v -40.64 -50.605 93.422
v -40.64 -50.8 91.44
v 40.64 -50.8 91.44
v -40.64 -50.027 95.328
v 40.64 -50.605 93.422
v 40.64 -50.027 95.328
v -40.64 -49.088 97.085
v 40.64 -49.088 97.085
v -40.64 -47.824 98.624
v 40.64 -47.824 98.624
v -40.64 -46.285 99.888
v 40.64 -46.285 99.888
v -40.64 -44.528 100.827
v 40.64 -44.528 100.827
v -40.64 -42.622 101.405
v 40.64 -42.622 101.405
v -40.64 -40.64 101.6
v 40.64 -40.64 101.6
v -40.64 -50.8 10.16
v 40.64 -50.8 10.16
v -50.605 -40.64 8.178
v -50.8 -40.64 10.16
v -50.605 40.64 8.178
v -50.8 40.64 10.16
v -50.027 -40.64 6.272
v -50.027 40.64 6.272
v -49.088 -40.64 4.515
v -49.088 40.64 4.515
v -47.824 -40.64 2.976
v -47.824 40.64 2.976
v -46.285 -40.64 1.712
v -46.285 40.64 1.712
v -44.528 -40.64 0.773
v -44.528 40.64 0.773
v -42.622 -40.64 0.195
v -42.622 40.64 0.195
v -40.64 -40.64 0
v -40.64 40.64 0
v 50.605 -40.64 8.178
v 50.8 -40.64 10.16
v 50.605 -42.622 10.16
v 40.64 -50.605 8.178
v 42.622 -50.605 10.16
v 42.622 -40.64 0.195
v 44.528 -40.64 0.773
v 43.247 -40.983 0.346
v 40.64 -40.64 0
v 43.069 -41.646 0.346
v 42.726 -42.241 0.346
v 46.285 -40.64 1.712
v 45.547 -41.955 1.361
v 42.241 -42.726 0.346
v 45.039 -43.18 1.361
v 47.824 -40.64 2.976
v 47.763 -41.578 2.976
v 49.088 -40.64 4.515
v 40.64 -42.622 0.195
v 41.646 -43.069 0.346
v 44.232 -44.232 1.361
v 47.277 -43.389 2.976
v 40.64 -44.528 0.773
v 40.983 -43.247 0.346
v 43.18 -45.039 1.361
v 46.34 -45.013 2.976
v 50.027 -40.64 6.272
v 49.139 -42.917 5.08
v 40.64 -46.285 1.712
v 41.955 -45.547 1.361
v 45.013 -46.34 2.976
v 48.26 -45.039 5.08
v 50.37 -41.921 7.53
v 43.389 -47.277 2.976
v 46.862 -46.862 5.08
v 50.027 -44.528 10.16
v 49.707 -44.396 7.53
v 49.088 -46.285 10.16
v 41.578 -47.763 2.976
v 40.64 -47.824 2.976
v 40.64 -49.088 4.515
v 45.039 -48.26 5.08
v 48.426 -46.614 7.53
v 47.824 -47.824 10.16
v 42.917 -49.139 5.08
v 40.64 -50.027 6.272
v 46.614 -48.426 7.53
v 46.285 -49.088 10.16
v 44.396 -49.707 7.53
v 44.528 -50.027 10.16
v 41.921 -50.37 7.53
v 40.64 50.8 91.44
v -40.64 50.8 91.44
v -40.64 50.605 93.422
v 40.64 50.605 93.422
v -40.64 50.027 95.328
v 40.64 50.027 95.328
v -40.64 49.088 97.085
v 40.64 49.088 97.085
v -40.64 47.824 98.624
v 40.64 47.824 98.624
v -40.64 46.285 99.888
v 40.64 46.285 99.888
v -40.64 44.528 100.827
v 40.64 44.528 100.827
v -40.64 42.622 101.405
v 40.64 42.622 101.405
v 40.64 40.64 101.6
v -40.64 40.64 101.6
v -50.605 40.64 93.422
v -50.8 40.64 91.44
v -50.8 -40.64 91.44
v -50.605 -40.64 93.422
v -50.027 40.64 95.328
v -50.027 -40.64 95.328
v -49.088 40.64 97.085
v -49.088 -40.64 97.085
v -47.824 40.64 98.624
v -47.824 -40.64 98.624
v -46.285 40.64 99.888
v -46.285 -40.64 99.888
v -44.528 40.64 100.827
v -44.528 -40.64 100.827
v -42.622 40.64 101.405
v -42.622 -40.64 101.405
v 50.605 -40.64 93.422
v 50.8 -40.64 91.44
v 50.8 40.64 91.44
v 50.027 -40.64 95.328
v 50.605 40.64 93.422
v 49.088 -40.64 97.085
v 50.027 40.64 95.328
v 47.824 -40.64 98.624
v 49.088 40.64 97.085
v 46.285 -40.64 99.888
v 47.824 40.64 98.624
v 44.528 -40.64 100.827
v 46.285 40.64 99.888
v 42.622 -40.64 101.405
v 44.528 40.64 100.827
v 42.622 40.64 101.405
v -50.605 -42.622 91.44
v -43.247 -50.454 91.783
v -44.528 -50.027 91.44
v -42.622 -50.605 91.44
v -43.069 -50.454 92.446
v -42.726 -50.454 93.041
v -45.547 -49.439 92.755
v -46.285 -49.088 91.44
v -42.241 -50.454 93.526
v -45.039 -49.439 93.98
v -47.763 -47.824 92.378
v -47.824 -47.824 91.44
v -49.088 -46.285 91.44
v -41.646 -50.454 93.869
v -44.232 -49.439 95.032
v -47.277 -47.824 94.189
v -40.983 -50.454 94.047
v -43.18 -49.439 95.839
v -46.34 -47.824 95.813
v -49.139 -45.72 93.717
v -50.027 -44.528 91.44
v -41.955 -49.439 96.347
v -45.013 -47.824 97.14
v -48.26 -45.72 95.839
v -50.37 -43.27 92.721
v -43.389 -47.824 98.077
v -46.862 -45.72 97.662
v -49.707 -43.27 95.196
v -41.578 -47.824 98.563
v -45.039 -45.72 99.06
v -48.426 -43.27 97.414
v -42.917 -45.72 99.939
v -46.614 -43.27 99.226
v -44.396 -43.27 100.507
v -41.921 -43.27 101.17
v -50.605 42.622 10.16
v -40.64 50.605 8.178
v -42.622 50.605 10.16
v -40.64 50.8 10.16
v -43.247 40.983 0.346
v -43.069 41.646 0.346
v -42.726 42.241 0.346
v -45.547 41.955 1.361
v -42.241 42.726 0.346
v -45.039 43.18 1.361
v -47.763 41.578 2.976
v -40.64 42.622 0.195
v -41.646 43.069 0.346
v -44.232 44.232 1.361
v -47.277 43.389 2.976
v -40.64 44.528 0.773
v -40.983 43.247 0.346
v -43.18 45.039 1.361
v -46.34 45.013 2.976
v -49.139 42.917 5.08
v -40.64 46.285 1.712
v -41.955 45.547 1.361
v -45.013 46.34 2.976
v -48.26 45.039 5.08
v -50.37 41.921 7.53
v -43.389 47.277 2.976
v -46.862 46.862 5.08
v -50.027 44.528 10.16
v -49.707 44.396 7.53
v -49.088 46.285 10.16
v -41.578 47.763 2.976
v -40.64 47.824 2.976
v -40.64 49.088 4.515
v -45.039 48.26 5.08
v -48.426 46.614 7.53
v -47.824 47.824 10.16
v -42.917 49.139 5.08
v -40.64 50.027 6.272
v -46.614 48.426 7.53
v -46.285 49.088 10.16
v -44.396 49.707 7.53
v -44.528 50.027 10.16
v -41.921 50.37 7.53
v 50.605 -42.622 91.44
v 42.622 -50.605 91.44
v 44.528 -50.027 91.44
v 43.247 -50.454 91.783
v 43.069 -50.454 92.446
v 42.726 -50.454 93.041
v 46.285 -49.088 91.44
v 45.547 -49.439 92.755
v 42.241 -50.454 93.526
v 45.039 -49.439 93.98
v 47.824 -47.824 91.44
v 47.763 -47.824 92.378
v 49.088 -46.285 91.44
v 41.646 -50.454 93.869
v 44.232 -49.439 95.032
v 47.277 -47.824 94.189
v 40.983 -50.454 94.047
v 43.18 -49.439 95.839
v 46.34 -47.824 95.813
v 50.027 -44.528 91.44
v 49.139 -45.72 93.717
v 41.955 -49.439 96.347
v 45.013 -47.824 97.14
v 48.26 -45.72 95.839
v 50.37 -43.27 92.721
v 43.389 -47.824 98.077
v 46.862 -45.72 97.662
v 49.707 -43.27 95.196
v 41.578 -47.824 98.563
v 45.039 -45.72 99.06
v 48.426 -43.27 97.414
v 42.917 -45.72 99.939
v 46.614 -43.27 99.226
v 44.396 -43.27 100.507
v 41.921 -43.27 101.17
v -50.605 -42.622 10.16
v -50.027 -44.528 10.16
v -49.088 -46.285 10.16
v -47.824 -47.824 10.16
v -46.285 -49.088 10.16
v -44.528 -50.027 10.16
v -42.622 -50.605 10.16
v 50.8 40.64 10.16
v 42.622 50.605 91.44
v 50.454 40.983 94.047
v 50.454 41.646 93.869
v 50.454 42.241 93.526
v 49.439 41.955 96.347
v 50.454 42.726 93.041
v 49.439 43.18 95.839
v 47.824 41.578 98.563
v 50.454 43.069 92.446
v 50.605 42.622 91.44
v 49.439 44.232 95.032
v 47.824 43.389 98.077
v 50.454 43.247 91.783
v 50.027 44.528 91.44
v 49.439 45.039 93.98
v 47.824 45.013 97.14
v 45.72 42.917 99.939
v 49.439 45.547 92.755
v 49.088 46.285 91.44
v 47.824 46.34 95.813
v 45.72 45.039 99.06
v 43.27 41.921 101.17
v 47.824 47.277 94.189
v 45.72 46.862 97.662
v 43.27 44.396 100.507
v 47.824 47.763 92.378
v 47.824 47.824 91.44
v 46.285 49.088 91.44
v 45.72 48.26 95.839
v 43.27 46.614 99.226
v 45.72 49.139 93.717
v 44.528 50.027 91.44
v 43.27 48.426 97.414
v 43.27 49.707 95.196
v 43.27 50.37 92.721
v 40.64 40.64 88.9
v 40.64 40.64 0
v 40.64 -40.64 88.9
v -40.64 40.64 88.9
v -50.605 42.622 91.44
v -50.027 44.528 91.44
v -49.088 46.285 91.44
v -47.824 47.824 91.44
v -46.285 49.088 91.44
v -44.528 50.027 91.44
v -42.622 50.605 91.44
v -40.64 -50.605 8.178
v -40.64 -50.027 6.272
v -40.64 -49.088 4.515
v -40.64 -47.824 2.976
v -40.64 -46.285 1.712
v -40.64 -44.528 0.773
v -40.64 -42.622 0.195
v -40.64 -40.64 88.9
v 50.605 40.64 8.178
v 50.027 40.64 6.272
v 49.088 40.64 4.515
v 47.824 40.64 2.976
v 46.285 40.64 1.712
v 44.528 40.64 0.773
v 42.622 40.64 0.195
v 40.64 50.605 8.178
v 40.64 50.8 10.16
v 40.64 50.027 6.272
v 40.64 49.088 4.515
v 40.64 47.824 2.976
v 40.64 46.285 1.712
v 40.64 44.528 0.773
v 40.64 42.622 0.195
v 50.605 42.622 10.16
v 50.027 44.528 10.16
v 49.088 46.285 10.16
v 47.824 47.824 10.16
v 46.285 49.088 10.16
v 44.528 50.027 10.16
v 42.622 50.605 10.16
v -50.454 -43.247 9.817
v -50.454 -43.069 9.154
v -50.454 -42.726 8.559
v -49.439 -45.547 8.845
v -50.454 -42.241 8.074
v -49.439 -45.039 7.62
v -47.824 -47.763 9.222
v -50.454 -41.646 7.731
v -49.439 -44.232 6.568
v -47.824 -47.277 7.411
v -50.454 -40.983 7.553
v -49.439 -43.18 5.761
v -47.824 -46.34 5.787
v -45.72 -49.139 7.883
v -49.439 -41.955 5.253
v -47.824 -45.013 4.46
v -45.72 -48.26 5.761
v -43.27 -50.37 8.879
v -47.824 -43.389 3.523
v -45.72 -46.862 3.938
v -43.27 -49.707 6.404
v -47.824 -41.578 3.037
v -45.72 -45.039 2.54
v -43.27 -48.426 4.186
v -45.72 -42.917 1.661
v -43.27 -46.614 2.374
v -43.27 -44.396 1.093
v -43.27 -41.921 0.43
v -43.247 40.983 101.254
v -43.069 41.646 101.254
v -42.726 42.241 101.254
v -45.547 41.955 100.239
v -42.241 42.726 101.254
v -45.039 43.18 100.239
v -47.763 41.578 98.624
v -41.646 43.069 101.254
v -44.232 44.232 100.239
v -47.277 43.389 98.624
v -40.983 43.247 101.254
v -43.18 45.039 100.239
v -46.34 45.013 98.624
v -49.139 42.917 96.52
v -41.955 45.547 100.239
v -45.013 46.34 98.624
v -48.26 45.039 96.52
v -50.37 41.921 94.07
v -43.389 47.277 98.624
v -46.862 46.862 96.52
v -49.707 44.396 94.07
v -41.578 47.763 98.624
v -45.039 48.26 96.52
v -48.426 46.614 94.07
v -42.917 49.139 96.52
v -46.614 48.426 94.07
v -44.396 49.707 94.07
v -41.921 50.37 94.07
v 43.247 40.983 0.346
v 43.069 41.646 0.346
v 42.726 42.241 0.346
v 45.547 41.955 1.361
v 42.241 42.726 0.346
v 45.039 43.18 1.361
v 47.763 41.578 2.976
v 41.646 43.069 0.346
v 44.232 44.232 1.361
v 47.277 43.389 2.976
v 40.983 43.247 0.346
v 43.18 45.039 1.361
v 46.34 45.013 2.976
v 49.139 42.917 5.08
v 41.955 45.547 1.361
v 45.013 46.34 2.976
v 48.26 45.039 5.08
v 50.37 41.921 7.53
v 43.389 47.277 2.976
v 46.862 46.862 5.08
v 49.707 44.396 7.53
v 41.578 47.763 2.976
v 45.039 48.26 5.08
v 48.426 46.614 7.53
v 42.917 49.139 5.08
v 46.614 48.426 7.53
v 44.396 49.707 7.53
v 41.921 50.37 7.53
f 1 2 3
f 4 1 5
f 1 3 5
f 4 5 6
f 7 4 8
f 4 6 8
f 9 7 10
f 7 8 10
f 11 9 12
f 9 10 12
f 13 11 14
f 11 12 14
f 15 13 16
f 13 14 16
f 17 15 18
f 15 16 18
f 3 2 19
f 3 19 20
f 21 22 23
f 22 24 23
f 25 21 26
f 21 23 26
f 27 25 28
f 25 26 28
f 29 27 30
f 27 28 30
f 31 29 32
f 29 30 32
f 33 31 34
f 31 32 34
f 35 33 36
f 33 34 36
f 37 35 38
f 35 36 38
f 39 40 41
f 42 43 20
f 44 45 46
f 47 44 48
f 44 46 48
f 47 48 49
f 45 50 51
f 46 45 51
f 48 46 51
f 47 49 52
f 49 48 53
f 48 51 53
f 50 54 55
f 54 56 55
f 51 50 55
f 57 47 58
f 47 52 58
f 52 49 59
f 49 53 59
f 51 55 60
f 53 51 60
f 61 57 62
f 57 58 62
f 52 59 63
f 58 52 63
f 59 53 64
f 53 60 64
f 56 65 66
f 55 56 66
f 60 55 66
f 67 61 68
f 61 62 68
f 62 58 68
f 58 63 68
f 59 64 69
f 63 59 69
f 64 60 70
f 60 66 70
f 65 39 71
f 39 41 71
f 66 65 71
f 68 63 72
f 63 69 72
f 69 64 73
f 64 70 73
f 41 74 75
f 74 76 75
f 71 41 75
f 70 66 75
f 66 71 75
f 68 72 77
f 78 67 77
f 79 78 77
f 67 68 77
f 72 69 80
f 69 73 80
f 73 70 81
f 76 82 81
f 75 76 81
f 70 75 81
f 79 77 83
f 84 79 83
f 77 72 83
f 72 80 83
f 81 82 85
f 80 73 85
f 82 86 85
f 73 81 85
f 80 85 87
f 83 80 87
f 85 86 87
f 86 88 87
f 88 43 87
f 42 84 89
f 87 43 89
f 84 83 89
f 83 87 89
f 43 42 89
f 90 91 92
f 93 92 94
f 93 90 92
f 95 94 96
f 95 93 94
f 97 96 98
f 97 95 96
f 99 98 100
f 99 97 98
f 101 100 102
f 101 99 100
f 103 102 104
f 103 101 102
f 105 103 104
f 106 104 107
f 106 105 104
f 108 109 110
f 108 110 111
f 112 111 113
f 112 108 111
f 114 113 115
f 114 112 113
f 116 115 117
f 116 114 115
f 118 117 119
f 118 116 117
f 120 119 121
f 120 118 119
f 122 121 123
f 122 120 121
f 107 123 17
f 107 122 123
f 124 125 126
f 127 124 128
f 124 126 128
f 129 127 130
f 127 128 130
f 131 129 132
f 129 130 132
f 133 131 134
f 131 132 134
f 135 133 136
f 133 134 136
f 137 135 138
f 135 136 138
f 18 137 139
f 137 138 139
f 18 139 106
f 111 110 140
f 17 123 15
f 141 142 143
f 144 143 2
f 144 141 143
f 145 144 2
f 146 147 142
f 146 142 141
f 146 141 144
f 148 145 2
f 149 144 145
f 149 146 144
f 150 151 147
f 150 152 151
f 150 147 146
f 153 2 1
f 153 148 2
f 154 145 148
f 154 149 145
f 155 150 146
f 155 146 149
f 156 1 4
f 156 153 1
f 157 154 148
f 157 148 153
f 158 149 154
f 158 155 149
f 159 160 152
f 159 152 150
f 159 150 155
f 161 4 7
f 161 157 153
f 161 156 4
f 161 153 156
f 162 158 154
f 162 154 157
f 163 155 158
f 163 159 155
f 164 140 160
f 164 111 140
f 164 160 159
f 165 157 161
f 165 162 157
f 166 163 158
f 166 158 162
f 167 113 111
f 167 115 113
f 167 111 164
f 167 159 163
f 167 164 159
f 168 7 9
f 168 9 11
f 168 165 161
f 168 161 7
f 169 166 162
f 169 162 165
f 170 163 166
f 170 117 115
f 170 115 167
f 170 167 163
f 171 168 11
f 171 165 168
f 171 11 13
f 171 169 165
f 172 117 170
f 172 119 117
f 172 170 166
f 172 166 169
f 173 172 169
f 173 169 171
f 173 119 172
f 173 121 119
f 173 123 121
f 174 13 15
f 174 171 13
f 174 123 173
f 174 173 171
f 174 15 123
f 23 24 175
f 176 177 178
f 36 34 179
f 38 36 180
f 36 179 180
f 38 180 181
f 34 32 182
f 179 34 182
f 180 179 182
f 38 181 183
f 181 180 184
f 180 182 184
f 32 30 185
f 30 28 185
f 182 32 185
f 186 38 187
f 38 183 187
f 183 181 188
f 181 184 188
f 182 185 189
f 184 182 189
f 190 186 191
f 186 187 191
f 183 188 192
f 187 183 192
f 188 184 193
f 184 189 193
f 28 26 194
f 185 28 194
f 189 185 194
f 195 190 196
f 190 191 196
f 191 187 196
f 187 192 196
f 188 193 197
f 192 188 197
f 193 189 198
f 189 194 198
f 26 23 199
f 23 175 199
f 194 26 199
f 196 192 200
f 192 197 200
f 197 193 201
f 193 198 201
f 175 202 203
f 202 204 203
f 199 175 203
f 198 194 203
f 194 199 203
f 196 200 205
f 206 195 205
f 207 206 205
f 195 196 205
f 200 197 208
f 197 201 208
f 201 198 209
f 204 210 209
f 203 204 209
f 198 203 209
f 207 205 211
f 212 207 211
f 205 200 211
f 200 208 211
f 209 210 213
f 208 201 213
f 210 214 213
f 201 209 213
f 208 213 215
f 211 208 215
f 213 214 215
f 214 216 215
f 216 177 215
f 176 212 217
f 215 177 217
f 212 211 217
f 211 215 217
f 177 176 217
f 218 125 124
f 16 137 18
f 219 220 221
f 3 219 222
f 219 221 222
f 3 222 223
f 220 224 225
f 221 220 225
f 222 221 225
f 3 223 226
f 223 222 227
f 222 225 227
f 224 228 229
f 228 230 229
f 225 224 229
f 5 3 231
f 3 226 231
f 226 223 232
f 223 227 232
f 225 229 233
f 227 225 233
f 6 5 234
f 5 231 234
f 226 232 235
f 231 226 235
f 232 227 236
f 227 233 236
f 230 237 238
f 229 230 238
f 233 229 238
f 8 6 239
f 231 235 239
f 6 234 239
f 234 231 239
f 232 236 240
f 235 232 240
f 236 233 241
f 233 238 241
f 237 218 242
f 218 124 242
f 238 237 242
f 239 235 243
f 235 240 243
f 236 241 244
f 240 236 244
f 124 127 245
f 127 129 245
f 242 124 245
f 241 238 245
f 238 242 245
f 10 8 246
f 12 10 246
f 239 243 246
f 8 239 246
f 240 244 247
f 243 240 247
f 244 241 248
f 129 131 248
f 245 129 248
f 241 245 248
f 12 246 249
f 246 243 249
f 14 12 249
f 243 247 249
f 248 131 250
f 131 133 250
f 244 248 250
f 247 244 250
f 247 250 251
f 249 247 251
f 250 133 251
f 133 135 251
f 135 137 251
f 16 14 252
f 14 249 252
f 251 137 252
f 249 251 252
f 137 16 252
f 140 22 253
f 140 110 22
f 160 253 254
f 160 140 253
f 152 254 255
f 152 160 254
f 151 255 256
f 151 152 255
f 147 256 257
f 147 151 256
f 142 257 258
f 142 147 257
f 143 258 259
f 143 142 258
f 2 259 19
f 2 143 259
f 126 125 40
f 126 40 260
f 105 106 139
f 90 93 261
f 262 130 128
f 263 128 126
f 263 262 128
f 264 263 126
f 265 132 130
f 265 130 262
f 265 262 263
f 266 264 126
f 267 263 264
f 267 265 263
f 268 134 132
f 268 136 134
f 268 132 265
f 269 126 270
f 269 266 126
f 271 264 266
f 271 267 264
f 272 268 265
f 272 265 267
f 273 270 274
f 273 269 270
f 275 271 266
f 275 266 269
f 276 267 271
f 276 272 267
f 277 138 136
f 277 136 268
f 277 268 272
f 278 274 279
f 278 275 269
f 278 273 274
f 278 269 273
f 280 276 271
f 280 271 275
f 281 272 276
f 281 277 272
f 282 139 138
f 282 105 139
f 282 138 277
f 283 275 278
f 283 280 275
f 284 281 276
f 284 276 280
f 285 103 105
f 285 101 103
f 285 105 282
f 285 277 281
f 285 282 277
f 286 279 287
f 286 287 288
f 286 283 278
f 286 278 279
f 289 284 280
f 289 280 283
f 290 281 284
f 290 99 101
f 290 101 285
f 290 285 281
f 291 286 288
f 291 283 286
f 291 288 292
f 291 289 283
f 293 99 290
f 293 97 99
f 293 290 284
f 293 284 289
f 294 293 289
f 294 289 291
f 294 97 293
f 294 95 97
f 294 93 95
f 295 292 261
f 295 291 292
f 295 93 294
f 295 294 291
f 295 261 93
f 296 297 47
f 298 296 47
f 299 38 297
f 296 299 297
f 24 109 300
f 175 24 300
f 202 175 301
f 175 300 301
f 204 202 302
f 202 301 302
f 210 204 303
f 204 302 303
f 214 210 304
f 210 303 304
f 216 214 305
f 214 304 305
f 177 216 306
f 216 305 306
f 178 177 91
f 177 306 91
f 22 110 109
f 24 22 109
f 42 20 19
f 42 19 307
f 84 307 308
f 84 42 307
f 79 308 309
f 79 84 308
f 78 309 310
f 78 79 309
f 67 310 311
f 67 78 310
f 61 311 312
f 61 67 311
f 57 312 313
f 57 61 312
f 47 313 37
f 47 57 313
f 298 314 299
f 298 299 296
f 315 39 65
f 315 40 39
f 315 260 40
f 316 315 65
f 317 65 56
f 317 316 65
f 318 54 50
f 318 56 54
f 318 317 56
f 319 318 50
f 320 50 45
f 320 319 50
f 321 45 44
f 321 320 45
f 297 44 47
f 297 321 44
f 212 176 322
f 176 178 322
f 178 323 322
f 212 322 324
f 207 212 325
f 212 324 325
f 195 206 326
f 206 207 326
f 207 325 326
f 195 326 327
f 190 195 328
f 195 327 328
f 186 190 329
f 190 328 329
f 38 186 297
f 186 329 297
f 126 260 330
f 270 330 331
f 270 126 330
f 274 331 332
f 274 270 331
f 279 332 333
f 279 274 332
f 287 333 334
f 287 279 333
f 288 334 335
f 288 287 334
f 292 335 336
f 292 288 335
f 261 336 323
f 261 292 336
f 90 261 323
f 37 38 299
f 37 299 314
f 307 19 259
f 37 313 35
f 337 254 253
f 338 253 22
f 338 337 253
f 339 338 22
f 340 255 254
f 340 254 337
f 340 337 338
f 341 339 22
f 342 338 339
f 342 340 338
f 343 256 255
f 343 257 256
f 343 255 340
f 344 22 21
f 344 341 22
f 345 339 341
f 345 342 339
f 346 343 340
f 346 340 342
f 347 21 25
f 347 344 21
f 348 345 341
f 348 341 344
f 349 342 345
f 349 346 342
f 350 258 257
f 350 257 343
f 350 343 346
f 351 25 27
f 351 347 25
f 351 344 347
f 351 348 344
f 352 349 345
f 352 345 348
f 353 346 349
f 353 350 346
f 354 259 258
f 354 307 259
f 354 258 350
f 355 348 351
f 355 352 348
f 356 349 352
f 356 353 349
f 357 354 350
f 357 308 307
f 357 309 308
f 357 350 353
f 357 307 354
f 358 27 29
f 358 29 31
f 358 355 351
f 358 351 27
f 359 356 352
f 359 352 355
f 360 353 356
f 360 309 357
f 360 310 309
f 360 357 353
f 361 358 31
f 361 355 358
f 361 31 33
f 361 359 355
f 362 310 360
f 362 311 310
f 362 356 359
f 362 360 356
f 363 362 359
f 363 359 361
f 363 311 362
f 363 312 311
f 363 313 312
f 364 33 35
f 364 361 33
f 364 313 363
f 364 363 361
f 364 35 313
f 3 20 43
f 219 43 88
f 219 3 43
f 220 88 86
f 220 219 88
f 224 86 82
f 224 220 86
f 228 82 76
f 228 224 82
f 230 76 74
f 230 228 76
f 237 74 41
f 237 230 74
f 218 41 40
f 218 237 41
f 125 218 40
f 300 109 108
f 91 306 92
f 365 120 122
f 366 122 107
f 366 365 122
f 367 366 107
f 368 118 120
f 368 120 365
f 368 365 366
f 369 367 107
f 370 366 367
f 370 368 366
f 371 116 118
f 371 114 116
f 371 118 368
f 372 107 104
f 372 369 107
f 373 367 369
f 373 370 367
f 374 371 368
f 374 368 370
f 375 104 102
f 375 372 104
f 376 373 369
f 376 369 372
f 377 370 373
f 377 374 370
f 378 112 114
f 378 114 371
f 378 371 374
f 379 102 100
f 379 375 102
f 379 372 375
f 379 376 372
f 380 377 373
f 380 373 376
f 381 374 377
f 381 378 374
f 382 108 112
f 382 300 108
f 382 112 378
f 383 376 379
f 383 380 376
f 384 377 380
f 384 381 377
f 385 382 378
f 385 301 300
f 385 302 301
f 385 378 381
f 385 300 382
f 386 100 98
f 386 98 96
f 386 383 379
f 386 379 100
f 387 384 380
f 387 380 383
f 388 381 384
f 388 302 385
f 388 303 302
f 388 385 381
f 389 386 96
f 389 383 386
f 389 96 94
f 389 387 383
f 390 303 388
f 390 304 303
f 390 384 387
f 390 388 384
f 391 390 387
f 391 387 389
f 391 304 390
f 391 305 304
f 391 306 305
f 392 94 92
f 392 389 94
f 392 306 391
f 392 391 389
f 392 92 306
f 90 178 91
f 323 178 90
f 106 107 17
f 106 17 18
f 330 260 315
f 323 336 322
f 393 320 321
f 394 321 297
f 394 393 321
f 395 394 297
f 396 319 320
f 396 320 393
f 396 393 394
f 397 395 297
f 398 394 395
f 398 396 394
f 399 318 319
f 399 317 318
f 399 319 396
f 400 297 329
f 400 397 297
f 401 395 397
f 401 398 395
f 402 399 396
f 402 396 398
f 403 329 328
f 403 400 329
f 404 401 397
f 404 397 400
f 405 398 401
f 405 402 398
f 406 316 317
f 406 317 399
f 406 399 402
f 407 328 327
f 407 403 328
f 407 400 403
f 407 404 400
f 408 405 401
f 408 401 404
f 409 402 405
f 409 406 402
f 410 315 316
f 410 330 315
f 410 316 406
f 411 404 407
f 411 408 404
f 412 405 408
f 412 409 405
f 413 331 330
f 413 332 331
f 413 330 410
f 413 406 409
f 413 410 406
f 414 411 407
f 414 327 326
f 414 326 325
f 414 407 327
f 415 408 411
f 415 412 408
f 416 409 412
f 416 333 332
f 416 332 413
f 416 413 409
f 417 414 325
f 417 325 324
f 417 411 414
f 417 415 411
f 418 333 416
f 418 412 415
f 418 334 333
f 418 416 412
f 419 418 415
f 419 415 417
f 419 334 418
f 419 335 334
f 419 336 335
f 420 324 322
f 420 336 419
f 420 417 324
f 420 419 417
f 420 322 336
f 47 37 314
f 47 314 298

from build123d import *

# Parameters (mm, degrees)
F0_W      = 101.6
F0_H      = 101.6
F1_DEPTH  = 101.6
F2_R      = 50.8
F3_DEPTH  = 101.6
F9_W      = 101.6
F9_H      = 101.6
F10_DEPTH = 101.6
F11_R     = 10.16
F12_W     = 81.28
F12_H     = 81.28
F14_DEPTH = 88.9


# Not quite as in the source:
# - a feature of the source that left no trace in its solid (it failed there, or was rolled back) is left out


with BuildPart() as f1:
    # F0 (on Top) → F1 (new body)
    with BuildSketch(Plane.XY):
        Rectangle(F0_W, F0_H)
    extrude(amount=F1_DEPTH)


with BuildPart() as f3:
    # F2 (on Top) → F3 (new body)
    with BuildSketch(Plane.XY):
        Circle(F2_R)
    extrude(amount=F3_DEPTH)


with BuildPart() as f5:
    # F4 (on Front) → F5 (revolve)
    with BuildSketch(Plane.XZ):
        with BuildLine():
            Line((-42.8895973013, 27.2235641188), (42.8895973013, -27.2235641188))
            ThreePointArc((42.8895973013, -27.2235641188), (27.2235641188, 42.8895973013), (-42.8895973013, 27.2235641188))
        make_face()
    revolve(axis=Axis((0, 0, 0), (0.8442834114, 0, -0.5358969315)))


with BuildPart() as f10:
    # F9 (on Top) → F10 (new body)
    with BuildSketch(Plane.XY):
        Rectangle(F9_W, F9_H)
    extrude(amount=F10_DEPTH)

    # F11
    f11_edges = [f10.edges().sort_by_distance(p)[0] for p in [
        (-50.8, 50.8, 50.8),
        (-50.8, 0, 101.6),
        (0, 50.8, 101.6),
        (50.8, 0, 101.6),
        (50.8, 50.8, 50.8),
        (50.8, -50.8, 50.8),
        (50.8, 0, 0),
        (0, -50.8, 0),
        (-50.8, -50.8, 50.8),
        (-50.8, 0, 0),
        (0, 50.8, 0),
        (0, -50.8, 101.6),
    ]]
    fillet(f11_edges, radius=F11_R)

    # F12 (on face) → F14 (cut)
    with BuildSketch(Plane(origin=(0, 0, 0), x_dir=(1, 0, 0), z_dir=(0, 0, -1))):
        Rectangle(F12_W, F12_H)
    extrude(amount=-F14_DEPTH, mode=Mode.SUBTRACT)


solid = f10.part
